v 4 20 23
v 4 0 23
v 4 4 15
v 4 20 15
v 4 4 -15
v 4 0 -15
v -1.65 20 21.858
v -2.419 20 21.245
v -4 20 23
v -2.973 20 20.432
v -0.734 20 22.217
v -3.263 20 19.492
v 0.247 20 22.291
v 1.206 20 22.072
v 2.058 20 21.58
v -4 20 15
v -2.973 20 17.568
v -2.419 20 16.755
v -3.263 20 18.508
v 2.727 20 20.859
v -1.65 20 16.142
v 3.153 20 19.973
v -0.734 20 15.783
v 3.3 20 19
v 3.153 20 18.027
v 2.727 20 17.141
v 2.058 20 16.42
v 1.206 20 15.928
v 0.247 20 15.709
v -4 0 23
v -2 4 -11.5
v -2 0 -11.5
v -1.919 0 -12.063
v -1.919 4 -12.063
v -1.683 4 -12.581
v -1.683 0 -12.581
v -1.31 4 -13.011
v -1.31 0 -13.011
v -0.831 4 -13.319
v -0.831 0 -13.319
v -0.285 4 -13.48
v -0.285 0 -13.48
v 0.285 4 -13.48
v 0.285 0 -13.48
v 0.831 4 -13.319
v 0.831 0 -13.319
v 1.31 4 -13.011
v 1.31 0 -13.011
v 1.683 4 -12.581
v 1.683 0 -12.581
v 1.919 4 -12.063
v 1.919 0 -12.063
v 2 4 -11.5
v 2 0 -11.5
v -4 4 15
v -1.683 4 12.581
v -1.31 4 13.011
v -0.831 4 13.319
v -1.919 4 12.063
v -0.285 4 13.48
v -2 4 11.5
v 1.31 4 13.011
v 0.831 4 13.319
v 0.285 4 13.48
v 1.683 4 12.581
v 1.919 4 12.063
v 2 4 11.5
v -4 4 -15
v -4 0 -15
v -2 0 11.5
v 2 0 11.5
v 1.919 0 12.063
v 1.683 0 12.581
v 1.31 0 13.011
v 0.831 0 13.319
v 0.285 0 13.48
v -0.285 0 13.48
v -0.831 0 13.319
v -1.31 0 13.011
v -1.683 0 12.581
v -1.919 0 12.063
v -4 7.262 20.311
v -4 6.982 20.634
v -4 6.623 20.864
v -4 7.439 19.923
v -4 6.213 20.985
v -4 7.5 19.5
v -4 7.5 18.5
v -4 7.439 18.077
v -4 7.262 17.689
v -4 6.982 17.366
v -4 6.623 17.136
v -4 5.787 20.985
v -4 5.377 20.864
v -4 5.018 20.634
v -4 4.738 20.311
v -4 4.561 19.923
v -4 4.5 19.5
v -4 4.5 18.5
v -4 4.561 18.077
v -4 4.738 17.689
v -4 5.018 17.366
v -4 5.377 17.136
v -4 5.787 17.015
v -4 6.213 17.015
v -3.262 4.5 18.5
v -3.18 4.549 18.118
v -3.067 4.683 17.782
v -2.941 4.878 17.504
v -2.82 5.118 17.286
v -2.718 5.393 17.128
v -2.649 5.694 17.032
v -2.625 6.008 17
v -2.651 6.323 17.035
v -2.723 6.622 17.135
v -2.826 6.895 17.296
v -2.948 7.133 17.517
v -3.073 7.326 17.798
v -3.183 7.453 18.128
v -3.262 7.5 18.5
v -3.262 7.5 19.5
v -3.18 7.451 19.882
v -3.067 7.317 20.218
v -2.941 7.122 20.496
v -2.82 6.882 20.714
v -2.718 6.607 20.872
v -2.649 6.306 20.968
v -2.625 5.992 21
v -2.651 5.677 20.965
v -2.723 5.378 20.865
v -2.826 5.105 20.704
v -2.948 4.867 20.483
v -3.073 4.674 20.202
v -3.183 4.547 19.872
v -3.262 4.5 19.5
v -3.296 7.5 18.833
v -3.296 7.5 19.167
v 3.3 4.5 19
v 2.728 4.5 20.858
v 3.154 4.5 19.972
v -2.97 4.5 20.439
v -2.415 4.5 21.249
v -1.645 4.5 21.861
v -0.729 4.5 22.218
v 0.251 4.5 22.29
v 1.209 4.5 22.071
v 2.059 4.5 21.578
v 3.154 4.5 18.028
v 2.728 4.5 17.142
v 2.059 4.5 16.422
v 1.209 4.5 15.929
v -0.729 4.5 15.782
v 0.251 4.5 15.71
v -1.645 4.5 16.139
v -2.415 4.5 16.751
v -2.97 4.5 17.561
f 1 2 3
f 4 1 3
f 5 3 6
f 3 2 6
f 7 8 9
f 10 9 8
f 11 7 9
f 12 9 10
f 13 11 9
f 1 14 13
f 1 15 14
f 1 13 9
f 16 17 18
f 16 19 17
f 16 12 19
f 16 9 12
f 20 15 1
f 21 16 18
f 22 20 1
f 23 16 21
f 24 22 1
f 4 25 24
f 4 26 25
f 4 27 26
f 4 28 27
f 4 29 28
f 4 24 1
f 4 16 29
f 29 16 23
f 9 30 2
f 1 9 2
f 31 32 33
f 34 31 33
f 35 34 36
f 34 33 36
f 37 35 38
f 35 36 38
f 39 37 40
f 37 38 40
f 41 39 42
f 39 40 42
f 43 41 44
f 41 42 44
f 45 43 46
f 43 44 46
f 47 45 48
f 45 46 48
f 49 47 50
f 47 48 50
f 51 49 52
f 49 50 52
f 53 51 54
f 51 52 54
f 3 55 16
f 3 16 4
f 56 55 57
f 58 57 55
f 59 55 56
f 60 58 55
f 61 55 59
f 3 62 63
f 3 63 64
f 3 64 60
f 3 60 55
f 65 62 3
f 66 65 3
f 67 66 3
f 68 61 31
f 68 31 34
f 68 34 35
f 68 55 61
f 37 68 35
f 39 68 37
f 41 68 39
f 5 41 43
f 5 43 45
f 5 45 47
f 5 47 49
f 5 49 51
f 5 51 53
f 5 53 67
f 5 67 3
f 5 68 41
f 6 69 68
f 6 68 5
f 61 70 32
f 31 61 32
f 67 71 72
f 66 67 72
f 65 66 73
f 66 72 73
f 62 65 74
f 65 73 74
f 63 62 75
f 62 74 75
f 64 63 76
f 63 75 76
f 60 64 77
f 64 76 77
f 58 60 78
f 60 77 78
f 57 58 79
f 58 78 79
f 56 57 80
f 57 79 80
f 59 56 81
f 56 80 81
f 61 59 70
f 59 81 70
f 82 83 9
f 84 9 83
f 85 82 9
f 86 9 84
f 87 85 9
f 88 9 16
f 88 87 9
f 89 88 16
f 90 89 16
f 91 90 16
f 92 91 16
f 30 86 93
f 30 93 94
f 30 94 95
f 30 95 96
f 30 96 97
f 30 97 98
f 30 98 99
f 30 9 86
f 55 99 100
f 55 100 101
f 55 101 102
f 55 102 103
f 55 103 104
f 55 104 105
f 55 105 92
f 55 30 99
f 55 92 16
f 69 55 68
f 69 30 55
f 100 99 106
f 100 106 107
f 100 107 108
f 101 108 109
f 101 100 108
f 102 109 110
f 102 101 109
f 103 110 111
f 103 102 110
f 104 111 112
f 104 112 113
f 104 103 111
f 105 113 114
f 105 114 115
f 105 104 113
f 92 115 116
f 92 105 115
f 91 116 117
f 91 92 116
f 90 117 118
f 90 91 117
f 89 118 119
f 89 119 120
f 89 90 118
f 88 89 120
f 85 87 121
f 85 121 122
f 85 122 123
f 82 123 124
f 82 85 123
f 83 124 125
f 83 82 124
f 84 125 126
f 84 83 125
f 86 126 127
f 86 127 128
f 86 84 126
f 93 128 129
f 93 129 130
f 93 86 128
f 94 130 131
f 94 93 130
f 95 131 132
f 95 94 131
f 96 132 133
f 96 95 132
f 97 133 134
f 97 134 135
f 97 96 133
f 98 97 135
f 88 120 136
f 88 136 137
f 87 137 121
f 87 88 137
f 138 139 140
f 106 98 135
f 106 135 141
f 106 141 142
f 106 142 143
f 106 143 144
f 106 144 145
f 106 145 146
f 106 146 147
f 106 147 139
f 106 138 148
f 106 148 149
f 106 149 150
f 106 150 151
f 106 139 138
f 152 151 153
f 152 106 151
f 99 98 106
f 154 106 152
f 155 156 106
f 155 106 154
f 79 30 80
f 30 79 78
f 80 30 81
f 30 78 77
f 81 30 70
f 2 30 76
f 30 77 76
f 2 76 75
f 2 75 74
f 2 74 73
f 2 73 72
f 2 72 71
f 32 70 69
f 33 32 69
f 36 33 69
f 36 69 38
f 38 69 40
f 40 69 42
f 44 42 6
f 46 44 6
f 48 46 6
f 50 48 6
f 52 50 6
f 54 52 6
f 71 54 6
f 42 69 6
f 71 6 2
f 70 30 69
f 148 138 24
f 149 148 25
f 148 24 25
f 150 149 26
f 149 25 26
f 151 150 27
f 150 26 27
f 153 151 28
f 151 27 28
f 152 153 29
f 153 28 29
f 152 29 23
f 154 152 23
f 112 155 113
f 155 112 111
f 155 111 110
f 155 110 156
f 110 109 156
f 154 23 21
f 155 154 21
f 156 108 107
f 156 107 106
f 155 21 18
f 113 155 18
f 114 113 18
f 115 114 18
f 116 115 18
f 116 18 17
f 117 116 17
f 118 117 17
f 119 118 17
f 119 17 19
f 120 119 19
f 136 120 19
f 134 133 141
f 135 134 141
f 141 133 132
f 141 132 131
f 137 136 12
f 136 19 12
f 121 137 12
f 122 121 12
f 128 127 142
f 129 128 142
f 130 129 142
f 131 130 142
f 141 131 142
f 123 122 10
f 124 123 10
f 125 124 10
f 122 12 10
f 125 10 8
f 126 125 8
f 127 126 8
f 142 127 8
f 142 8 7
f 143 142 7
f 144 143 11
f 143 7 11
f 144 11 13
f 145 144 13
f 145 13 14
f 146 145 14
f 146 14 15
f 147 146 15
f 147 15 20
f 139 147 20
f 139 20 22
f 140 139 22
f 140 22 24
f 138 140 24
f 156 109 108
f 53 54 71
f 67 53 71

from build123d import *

# Parameters (mm, degrees)
SKETCH2_W           = 8
SKETCH2_H           = 30
BOSS_EXTRUDE1_DEPTH = 4
CUT_EXTRUDE1_DEPTH  = 5
SKETCH4_W           = 8
SKETCH4_H           = 8
BOSS_EXTRUDE2_DEPTH = 20
SKETCH5_R           = 3.3
CUT_EXTRUDE2_DEPTH  = 15.5
CUT_EXTRUDE3_REACH  = 10


with BuildPart() as part:
    # Sketch2 → Boss-Extrude1 (new body)
    with BuildSketch(Plane(origin=(0, 0, 0), x_dir=(1, 0, 0), z_dir=(0, 1, 0))):
        Rectangle(SKETCH2_W, SKETCH2_H)
    extrude(amount=BOSS_EXTRUDE1_DEPTH)

    # Sketch3 → Cut-Extrude1 (cut, through all)
    with BuildSketch(Plane(origin=(0, 0, 0), x_dir=(1, 0, 0), z_dir=(0, 1, 0))):
        with BuildLine():
            Line((-2, -11.5), (-2, 11.5))
            ThreePointArc((-2, 11.5), (0, 13.5), (2, 11.5))
            Line((2, 11.5), (2, -11.5))
            ThreePointArc((2, -11.5), (0, -13.5), (-2, -11.5))
        make_face()
    extrude(amount=CUT_EXTRUDE1_DEPTH, mode=Mode.SUBTRACT)

    # Sketch4 → Boss-Extrude2 (add)
    with BuildSketch(Plane(origin=(0, 0, 0), x_dir=(1, 0, 0), z_dir=(0, 1, 0))):
        with Locations((0, -19)):
            Rectangle(SKETCH4_W, SKETCH4_H)
    extrude(amount=BOSS_EXTRUDE2_DEPTH)

    # Sketch5 → Cut-Extrude2 (cut)
    with BuildSketch(Plane(origin=(0, 20, 0), x_dir=(1, 0, 0), z_dir=(0, 1, 0))):
        with Locations((0, -19)):
            Circle(SKETCH5_R)
    extrude(amount=-CUT_EXTRUDE2_DEPTH, mode=Mode.SUBTRACT)

    # Sketch6 → Cut-Extrude3 (cut, up to next)
    with BuildSketch(Plane.ZY.offset(4), mode=Mode.PRIVATE) as cut_extrude3_sk1:
        with BuildLine():
            Line((19.5, 4.5), (18.5, 4.5))
            ThreePointArc((18.5, 4.5), (17, 6), (18.5, 7.5))
            Line((18.5, 7.5), (19.5, 7.5))
            ThreePointArc((19.5, 7.5), (21, 6), (19.5, 4.5))
        make_face()
    cut_extrude3_tool1 = extrude(cut_extrude3_sk1.sketch, amount=-CUT_EXTRUDE3_REACH, mode=Mode.PRIVATE) & part.part
    add(cut_extrude3_tool1.solids().sort_by_distance((-4, 6, 19))[0], mode=Mode.SUBTRACT)


solid = part.part
